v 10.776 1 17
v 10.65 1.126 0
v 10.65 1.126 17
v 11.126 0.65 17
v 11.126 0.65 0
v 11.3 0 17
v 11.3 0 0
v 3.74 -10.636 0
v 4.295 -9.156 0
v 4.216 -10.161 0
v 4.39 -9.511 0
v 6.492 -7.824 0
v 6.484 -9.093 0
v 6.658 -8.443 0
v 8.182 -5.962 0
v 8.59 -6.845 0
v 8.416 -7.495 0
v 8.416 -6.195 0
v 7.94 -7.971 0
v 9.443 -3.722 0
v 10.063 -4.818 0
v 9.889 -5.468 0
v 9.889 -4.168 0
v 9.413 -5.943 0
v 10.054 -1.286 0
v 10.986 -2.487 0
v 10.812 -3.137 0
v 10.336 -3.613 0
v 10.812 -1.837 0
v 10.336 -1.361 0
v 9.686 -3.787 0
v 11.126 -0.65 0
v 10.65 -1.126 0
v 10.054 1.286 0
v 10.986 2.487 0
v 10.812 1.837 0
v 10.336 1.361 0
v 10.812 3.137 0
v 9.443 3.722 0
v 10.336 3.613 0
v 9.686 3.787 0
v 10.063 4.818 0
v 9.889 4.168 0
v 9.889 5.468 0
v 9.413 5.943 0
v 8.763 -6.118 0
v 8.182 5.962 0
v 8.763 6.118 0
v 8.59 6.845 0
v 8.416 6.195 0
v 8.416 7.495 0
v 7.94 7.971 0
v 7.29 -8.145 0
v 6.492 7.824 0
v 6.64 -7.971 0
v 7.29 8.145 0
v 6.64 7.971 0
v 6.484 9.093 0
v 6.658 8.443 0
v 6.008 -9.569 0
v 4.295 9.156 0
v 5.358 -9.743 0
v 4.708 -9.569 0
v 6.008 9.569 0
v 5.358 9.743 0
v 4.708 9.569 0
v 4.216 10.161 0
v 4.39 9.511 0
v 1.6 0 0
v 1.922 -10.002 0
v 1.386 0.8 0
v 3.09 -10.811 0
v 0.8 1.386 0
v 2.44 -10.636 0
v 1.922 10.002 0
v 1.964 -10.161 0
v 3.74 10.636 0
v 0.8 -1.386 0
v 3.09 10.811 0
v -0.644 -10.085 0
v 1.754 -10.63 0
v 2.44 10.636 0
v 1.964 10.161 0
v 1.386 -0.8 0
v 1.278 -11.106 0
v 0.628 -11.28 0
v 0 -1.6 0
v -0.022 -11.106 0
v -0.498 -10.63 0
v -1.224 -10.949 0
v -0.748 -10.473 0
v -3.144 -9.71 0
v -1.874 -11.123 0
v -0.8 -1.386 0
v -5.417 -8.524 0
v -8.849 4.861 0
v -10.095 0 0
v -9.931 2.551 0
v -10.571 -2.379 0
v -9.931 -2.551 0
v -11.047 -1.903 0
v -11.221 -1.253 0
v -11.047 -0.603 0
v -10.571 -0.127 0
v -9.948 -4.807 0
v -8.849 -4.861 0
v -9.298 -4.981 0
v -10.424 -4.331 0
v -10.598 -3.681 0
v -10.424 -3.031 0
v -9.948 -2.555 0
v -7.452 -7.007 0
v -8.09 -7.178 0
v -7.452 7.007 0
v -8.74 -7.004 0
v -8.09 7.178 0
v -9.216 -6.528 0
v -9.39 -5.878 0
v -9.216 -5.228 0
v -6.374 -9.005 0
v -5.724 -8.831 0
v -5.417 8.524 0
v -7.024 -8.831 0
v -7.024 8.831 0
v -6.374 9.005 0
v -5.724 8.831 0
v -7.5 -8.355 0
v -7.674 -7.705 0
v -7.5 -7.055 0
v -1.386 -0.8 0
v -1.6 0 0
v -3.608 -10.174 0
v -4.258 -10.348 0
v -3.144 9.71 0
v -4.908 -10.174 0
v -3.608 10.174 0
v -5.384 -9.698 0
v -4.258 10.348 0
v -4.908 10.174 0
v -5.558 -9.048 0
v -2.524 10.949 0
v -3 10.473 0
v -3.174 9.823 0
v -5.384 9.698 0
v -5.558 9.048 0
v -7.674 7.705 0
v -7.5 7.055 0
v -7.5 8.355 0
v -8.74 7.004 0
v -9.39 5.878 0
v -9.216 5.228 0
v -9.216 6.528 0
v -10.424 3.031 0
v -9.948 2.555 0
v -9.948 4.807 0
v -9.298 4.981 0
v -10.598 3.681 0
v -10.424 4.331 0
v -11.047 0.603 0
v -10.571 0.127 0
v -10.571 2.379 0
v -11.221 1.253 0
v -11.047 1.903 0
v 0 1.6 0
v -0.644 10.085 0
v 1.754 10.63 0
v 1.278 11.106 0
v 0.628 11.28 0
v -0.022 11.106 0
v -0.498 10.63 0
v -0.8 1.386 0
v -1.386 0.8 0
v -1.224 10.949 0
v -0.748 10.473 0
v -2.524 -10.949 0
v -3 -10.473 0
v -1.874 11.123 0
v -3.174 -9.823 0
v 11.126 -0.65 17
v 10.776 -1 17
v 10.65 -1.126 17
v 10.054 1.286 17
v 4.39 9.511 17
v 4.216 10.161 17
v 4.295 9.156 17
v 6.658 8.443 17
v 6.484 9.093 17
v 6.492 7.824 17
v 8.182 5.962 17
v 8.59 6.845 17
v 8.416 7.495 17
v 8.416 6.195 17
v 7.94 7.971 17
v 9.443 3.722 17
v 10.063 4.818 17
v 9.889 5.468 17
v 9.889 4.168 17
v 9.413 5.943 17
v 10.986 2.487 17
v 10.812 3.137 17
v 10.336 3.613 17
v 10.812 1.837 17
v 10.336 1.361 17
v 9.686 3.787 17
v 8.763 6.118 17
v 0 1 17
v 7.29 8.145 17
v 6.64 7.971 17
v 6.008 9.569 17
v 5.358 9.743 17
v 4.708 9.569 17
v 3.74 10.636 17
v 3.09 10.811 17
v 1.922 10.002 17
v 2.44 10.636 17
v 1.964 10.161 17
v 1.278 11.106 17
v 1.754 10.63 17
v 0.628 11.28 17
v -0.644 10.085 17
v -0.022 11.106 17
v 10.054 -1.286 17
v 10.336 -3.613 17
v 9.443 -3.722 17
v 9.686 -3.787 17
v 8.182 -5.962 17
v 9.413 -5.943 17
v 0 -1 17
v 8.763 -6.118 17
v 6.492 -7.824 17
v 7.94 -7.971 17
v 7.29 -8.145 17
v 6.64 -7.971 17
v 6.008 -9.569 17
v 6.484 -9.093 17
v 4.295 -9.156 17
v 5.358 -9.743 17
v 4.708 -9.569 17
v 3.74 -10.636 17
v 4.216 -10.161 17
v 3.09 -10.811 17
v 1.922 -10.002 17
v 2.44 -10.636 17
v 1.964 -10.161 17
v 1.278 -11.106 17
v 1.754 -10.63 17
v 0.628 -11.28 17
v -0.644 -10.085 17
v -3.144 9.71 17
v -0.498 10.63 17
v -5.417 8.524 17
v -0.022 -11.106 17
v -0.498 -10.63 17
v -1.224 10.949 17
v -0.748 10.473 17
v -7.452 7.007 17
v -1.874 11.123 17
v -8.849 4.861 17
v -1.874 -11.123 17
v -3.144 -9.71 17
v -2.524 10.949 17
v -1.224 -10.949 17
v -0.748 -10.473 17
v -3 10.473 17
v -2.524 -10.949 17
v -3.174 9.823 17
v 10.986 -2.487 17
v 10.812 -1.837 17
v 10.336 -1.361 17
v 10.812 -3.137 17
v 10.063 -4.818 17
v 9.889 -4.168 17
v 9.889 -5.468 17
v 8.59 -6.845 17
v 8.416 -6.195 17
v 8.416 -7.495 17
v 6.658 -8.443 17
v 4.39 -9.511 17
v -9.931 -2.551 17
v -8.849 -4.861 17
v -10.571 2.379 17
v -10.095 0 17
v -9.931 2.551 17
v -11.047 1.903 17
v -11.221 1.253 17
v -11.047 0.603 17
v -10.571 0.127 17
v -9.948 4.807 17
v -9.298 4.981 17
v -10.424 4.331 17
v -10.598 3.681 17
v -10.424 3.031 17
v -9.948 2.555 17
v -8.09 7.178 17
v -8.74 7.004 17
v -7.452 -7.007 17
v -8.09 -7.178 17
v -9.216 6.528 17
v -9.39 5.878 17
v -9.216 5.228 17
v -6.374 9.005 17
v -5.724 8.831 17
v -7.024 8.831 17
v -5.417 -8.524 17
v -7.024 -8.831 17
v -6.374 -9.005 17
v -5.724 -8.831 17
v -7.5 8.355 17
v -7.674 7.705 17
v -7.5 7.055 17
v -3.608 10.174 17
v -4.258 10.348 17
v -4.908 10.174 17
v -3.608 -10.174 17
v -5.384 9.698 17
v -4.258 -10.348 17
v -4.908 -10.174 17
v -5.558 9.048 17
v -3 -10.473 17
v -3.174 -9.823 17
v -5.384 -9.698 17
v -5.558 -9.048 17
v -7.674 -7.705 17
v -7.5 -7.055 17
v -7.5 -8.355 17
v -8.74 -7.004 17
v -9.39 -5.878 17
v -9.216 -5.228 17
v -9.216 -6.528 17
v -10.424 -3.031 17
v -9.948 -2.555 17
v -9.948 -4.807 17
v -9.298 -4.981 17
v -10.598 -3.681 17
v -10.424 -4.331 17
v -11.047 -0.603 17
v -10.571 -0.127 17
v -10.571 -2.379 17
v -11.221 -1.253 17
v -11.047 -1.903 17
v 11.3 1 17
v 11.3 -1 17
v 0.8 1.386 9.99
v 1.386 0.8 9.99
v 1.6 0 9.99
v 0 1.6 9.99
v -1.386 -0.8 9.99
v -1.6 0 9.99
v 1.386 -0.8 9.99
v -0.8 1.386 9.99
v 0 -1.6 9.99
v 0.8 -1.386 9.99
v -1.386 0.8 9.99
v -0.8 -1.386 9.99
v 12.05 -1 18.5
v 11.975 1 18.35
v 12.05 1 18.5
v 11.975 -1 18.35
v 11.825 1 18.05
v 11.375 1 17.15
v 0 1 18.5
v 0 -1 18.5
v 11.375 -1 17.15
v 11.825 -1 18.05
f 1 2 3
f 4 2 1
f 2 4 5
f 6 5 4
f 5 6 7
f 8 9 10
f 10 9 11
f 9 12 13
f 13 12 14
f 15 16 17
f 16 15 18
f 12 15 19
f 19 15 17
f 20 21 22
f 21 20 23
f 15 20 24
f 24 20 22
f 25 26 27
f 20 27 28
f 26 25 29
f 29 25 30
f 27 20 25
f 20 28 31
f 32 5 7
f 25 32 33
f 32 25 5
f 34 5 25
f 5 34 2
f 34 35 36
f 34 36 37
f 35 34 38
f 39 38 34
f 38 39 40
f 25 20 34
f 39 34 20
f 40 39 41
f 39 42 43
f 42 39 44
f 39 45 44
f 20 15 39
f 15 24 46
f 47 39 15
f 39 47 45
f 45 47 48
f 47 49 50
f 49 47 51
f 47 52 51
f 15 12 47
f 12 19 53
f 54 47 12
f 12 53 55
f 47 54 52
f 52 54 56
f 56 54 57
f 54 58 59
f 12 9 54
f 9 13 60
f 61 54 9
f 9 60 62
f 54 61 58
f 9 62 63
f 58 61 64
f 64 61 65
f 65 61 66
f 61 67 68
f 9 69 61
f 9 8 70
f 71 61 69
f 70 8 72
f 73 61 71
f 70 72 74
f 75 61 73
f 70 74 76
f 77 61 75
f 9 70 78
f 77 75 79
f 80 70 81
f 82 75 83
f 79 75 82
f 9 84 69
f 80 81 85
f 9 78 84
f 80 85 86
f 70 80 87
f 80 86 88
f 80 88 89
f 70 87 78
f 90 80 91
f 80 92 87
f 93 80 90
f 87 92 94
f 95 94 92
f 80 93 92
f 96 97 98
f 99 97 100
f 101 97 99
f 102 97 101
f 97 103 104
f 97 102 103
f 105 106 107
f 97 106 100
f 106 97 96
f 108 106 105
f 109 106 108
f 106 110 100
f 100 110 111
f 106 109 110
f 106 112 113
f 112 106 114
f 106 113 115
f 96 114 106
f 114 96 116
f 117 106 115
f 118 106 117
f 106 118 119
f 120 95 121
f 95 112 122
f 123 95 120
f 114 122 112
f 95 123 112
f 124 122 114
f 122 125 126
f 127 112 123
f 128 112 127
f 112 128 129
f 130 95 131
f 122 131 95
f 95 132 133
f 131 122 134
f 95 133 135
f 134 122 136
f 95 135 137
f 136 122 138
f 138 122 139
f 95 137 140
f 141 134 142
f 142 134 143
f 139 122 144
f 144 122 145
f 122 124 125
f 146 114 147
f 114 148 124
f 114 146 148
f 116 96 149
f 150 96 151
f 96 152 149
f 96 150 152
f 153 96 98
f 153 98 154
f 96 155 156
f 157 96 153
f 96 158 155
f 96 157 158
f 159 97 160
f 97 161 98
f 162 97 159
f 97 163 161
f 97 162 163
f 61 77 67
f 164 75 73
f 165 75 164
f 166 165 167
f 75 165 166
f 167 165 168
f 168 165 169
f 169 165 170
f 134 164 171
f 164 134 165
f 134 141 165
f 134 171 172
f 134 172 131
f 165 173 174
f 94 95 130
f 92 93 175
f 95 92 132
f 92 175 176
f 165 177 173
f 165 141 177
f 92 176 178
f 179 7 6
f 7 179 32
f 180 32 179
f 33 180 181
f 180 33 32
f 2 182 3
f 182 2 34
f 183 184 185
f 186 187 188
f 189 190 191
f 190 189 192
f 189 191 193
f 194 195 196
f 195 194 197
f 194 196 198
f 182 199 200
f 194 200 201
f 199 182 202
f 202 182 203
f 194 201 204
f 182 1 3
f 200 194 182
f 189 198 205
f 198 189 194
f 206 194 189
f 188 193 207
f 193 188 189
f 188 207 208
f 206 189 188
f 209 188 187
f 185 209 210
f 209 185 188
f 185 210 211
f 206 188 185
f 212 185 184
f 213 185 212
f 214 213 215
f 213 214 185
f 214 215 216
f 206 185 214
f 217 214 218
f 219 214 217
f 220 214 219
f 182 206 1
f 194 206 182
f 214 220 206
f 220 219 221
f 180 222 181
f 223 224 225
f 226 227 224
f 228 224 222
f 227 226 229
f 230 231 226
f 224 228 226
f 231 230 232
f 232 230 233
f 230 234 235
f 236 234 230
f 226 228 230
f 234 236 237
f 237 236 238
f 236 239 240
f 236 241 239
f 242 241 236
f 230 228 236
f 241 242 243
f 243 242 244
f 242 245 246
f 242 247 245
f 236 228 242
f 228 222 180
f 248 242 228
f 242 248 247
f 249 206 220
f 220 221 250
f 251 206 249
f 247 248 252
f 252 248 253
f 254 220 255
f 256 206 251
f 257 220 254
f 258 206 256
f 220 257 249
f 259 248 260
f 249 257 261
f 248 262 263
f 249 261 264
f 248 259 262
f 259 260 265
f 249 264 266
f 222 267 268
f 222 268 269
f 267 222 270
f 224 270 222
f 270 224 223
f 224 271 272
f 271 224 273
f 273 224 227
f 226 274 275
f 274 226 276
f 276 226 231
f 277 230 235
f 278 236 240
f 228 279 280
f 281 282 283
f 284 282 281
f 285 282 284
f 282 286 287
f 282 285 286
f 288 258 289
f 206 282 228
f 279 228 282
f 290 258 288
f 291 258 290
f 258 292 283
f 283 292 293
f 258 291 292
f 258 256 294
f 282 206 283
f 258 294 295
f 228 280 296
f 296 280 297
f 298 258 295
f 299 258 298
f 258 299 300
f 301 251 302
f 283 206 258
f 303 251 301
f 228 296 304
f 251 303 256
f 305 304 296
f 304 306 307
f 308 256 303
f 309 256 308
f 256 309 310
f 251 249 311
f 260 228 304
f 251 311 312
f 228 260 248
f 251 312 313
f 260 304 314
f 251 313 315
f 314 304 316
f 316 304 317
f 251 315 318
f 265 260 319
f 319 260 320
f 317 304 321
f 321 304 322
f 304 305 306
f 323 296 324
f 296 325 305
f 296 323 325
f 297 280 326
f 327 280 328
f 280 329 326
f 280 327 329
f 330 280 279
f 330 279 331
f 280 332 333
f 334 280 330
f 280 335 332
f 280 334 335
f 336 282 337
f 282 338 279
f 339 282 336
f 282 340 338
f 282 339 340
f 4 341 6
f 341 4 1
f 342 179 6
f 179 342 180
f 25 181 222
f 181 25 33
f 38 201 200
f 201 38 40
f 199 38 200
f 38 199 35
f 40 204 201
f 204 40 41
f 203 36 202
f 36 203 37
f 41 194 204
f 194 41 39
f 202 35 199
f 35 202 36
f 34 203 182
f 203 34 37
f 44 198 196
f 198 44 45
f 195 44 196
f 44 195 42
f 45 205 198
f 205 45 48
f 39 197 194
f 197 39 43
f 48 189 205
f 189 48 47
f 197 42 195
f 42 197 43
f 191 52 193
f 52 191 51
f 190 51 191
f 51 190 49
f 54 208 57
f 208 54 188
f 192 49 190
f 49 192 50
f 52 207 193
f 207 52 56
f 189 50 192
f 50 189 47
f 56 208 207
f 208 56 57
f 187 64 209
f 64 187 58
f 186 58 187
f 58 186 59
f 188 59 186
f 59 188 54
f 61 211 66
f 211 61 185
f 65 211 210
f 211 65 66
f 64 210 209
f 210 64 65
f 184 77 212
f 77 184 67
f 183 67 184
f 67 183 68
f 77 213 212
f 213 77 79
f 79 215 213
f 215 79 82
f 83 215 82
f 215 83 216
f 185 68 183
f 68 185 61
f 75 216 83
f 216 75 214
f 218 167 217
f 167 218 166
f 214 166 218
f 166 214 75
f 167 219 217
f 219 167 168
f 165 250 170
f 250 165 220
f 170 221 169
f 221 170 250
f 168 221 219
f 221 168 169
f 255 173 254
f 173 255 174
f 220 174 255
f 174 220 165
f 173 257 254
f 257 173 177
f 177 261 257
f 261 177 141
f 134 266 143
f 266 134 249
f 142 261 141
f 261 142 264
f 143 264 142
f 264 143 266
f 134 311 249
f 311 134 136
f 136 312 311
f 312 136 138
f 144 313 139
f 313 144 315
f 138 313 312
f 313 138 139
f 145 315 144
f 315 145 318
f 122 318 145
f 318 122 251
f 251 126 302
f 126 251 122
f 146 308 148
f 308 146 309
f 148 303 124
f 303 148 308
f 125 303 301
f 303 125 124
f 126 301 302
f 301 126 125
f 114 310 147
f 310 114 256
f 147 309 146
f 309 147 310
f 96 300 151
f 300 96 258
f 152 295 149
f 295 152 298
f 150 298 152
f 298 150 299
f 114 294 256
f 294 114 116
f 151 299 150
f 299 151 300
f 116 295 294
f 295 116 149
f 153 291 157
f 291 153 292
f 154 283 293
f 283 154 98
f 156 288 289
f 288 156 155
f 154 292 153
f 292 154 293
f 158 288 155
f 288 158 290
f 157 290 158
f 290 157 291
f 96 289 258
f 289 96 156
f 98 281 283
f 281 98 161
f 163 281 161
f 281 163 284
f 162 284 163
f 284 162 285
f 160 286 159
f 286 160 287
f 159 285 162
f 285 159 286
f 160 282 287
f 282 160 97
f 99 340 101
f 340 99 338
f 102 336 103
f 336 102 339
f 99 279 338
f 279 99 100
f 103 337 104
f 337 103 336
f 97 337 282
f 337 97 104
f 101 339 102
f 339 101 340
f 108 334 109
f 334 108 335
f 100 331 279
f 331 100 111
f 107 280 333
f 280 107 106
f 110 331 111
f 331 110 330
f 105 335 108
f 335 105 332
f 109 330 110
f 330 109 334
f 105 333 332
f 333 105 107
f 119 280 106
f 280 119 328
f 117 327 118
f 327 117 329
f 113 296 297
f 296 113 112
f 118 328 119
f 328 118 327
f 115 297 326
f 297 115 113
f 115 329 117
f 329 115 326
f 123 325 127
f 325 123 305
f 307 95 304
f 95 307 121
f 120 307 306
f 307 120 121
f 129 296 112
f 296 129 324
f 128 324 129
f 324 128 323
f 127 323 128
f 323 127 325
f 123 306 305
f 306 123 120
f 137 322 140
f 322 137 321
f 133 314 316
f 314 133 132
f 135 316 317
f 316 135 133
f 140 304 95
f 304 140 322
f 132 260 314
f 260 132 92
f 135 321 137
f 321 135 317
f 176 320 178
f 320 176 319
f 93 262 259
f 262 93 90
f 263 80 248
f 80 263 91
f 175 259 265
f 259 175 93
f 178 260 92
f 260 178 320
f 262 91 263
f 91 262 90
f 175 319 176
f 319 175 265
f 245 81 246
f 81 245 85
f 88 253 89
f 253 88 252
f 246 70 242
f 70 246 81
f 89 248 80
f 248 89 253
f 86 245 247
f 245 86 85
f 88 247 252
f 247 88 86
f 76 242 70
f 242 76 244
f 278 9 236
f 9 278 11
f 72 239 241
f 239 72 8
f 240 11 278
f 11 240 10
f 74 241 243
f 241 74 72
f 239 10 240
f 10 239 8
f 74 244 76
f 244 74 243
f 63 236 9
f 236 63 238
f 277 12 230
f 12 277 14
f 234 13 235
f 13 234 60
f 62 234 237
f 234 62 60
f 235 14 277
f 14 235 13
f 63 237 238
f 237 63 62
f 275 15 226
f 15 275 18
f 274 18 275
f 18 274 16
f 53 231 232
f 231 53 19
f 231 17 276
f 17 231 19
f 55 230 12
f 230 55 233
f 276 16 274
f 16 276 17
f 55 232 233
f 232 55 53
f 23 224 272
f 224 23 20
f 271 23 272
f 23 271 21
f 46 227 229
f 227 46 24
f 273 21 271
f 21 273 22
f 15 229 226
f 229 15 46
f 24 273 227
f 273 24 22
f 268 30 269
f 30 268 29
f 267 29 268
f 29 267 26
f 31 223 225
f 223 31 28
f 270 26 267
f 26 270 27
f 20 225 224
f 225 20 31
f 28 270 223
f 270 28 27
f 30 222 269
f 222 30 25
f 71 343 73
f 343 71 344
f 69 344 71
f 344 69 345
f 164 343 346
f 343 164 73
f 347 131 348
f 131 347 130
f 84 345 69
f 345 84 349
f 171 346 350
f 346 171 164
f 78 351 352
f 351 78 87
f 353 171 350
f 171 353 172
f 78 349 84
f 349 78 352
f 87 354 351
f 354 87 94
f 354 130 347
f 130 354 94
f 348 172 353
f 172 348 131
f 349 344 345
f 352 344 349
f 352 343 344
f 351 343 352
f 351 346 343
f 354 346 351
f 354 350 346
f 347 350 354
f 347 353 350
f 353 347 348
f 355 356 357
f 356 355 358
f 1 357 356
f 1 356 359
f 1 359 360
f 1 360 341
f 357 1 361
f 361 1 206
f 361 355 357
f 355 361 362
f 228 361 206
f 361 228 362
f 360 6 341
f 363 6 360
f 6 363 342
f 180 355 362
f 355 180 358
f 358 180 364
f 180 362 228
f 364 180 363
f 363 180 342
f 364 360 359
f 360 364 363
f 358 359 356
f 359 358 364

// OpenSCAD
// Licensed under MIT license or CC 3.0-by-nc-sa

use <tubemesh.scad>;

//<params>
d = 20;
h = 17;
lineHeight = 1.5;
lineThickness = 2;
holeDiameter = 3.2;
holeHeight = 10;
stickoutRatio = 0.5;
knurl = 1.3;
//</params>

module knurledCylinder(h=10,r1=5,r2=1.5) {
    n = ceil(2 * PI * r1 / (2 * r2));
    cylinder(h=h,r=r1,$fn=n);
    for (i=[0:n-1]) {
        x = r1*cos(360./n*i);
        y = r1*sin(360./n*i);
        translate([x,y,0]) cylinder(h=h,r=r2,$fn=12);
    }
}

render(convexity=3) 
difference() {
knurledCylinder(h=h,r1=d/2,r2=knurl);
translate([0,0,-0.01]) cylinder(h=holeHeight,d=holeDiameter,$fn=12);
}

translate([0,0,h])
morphExtrude([[0,-lineThickness/2],[d/2+knurl,-lineThickness/2],[d/2+knurl,lineThickness/2],[0,lineThickness/2]], 
    [[0,-lineThickness/2],[d/2+knurl+lineHeight*stickoutRatio,-lineThickness/2],[d/2+knurl+lineHeight*stickoutRatio,lineThickness/2],[0,lineThickness/2]],
    height=lineHeight);
